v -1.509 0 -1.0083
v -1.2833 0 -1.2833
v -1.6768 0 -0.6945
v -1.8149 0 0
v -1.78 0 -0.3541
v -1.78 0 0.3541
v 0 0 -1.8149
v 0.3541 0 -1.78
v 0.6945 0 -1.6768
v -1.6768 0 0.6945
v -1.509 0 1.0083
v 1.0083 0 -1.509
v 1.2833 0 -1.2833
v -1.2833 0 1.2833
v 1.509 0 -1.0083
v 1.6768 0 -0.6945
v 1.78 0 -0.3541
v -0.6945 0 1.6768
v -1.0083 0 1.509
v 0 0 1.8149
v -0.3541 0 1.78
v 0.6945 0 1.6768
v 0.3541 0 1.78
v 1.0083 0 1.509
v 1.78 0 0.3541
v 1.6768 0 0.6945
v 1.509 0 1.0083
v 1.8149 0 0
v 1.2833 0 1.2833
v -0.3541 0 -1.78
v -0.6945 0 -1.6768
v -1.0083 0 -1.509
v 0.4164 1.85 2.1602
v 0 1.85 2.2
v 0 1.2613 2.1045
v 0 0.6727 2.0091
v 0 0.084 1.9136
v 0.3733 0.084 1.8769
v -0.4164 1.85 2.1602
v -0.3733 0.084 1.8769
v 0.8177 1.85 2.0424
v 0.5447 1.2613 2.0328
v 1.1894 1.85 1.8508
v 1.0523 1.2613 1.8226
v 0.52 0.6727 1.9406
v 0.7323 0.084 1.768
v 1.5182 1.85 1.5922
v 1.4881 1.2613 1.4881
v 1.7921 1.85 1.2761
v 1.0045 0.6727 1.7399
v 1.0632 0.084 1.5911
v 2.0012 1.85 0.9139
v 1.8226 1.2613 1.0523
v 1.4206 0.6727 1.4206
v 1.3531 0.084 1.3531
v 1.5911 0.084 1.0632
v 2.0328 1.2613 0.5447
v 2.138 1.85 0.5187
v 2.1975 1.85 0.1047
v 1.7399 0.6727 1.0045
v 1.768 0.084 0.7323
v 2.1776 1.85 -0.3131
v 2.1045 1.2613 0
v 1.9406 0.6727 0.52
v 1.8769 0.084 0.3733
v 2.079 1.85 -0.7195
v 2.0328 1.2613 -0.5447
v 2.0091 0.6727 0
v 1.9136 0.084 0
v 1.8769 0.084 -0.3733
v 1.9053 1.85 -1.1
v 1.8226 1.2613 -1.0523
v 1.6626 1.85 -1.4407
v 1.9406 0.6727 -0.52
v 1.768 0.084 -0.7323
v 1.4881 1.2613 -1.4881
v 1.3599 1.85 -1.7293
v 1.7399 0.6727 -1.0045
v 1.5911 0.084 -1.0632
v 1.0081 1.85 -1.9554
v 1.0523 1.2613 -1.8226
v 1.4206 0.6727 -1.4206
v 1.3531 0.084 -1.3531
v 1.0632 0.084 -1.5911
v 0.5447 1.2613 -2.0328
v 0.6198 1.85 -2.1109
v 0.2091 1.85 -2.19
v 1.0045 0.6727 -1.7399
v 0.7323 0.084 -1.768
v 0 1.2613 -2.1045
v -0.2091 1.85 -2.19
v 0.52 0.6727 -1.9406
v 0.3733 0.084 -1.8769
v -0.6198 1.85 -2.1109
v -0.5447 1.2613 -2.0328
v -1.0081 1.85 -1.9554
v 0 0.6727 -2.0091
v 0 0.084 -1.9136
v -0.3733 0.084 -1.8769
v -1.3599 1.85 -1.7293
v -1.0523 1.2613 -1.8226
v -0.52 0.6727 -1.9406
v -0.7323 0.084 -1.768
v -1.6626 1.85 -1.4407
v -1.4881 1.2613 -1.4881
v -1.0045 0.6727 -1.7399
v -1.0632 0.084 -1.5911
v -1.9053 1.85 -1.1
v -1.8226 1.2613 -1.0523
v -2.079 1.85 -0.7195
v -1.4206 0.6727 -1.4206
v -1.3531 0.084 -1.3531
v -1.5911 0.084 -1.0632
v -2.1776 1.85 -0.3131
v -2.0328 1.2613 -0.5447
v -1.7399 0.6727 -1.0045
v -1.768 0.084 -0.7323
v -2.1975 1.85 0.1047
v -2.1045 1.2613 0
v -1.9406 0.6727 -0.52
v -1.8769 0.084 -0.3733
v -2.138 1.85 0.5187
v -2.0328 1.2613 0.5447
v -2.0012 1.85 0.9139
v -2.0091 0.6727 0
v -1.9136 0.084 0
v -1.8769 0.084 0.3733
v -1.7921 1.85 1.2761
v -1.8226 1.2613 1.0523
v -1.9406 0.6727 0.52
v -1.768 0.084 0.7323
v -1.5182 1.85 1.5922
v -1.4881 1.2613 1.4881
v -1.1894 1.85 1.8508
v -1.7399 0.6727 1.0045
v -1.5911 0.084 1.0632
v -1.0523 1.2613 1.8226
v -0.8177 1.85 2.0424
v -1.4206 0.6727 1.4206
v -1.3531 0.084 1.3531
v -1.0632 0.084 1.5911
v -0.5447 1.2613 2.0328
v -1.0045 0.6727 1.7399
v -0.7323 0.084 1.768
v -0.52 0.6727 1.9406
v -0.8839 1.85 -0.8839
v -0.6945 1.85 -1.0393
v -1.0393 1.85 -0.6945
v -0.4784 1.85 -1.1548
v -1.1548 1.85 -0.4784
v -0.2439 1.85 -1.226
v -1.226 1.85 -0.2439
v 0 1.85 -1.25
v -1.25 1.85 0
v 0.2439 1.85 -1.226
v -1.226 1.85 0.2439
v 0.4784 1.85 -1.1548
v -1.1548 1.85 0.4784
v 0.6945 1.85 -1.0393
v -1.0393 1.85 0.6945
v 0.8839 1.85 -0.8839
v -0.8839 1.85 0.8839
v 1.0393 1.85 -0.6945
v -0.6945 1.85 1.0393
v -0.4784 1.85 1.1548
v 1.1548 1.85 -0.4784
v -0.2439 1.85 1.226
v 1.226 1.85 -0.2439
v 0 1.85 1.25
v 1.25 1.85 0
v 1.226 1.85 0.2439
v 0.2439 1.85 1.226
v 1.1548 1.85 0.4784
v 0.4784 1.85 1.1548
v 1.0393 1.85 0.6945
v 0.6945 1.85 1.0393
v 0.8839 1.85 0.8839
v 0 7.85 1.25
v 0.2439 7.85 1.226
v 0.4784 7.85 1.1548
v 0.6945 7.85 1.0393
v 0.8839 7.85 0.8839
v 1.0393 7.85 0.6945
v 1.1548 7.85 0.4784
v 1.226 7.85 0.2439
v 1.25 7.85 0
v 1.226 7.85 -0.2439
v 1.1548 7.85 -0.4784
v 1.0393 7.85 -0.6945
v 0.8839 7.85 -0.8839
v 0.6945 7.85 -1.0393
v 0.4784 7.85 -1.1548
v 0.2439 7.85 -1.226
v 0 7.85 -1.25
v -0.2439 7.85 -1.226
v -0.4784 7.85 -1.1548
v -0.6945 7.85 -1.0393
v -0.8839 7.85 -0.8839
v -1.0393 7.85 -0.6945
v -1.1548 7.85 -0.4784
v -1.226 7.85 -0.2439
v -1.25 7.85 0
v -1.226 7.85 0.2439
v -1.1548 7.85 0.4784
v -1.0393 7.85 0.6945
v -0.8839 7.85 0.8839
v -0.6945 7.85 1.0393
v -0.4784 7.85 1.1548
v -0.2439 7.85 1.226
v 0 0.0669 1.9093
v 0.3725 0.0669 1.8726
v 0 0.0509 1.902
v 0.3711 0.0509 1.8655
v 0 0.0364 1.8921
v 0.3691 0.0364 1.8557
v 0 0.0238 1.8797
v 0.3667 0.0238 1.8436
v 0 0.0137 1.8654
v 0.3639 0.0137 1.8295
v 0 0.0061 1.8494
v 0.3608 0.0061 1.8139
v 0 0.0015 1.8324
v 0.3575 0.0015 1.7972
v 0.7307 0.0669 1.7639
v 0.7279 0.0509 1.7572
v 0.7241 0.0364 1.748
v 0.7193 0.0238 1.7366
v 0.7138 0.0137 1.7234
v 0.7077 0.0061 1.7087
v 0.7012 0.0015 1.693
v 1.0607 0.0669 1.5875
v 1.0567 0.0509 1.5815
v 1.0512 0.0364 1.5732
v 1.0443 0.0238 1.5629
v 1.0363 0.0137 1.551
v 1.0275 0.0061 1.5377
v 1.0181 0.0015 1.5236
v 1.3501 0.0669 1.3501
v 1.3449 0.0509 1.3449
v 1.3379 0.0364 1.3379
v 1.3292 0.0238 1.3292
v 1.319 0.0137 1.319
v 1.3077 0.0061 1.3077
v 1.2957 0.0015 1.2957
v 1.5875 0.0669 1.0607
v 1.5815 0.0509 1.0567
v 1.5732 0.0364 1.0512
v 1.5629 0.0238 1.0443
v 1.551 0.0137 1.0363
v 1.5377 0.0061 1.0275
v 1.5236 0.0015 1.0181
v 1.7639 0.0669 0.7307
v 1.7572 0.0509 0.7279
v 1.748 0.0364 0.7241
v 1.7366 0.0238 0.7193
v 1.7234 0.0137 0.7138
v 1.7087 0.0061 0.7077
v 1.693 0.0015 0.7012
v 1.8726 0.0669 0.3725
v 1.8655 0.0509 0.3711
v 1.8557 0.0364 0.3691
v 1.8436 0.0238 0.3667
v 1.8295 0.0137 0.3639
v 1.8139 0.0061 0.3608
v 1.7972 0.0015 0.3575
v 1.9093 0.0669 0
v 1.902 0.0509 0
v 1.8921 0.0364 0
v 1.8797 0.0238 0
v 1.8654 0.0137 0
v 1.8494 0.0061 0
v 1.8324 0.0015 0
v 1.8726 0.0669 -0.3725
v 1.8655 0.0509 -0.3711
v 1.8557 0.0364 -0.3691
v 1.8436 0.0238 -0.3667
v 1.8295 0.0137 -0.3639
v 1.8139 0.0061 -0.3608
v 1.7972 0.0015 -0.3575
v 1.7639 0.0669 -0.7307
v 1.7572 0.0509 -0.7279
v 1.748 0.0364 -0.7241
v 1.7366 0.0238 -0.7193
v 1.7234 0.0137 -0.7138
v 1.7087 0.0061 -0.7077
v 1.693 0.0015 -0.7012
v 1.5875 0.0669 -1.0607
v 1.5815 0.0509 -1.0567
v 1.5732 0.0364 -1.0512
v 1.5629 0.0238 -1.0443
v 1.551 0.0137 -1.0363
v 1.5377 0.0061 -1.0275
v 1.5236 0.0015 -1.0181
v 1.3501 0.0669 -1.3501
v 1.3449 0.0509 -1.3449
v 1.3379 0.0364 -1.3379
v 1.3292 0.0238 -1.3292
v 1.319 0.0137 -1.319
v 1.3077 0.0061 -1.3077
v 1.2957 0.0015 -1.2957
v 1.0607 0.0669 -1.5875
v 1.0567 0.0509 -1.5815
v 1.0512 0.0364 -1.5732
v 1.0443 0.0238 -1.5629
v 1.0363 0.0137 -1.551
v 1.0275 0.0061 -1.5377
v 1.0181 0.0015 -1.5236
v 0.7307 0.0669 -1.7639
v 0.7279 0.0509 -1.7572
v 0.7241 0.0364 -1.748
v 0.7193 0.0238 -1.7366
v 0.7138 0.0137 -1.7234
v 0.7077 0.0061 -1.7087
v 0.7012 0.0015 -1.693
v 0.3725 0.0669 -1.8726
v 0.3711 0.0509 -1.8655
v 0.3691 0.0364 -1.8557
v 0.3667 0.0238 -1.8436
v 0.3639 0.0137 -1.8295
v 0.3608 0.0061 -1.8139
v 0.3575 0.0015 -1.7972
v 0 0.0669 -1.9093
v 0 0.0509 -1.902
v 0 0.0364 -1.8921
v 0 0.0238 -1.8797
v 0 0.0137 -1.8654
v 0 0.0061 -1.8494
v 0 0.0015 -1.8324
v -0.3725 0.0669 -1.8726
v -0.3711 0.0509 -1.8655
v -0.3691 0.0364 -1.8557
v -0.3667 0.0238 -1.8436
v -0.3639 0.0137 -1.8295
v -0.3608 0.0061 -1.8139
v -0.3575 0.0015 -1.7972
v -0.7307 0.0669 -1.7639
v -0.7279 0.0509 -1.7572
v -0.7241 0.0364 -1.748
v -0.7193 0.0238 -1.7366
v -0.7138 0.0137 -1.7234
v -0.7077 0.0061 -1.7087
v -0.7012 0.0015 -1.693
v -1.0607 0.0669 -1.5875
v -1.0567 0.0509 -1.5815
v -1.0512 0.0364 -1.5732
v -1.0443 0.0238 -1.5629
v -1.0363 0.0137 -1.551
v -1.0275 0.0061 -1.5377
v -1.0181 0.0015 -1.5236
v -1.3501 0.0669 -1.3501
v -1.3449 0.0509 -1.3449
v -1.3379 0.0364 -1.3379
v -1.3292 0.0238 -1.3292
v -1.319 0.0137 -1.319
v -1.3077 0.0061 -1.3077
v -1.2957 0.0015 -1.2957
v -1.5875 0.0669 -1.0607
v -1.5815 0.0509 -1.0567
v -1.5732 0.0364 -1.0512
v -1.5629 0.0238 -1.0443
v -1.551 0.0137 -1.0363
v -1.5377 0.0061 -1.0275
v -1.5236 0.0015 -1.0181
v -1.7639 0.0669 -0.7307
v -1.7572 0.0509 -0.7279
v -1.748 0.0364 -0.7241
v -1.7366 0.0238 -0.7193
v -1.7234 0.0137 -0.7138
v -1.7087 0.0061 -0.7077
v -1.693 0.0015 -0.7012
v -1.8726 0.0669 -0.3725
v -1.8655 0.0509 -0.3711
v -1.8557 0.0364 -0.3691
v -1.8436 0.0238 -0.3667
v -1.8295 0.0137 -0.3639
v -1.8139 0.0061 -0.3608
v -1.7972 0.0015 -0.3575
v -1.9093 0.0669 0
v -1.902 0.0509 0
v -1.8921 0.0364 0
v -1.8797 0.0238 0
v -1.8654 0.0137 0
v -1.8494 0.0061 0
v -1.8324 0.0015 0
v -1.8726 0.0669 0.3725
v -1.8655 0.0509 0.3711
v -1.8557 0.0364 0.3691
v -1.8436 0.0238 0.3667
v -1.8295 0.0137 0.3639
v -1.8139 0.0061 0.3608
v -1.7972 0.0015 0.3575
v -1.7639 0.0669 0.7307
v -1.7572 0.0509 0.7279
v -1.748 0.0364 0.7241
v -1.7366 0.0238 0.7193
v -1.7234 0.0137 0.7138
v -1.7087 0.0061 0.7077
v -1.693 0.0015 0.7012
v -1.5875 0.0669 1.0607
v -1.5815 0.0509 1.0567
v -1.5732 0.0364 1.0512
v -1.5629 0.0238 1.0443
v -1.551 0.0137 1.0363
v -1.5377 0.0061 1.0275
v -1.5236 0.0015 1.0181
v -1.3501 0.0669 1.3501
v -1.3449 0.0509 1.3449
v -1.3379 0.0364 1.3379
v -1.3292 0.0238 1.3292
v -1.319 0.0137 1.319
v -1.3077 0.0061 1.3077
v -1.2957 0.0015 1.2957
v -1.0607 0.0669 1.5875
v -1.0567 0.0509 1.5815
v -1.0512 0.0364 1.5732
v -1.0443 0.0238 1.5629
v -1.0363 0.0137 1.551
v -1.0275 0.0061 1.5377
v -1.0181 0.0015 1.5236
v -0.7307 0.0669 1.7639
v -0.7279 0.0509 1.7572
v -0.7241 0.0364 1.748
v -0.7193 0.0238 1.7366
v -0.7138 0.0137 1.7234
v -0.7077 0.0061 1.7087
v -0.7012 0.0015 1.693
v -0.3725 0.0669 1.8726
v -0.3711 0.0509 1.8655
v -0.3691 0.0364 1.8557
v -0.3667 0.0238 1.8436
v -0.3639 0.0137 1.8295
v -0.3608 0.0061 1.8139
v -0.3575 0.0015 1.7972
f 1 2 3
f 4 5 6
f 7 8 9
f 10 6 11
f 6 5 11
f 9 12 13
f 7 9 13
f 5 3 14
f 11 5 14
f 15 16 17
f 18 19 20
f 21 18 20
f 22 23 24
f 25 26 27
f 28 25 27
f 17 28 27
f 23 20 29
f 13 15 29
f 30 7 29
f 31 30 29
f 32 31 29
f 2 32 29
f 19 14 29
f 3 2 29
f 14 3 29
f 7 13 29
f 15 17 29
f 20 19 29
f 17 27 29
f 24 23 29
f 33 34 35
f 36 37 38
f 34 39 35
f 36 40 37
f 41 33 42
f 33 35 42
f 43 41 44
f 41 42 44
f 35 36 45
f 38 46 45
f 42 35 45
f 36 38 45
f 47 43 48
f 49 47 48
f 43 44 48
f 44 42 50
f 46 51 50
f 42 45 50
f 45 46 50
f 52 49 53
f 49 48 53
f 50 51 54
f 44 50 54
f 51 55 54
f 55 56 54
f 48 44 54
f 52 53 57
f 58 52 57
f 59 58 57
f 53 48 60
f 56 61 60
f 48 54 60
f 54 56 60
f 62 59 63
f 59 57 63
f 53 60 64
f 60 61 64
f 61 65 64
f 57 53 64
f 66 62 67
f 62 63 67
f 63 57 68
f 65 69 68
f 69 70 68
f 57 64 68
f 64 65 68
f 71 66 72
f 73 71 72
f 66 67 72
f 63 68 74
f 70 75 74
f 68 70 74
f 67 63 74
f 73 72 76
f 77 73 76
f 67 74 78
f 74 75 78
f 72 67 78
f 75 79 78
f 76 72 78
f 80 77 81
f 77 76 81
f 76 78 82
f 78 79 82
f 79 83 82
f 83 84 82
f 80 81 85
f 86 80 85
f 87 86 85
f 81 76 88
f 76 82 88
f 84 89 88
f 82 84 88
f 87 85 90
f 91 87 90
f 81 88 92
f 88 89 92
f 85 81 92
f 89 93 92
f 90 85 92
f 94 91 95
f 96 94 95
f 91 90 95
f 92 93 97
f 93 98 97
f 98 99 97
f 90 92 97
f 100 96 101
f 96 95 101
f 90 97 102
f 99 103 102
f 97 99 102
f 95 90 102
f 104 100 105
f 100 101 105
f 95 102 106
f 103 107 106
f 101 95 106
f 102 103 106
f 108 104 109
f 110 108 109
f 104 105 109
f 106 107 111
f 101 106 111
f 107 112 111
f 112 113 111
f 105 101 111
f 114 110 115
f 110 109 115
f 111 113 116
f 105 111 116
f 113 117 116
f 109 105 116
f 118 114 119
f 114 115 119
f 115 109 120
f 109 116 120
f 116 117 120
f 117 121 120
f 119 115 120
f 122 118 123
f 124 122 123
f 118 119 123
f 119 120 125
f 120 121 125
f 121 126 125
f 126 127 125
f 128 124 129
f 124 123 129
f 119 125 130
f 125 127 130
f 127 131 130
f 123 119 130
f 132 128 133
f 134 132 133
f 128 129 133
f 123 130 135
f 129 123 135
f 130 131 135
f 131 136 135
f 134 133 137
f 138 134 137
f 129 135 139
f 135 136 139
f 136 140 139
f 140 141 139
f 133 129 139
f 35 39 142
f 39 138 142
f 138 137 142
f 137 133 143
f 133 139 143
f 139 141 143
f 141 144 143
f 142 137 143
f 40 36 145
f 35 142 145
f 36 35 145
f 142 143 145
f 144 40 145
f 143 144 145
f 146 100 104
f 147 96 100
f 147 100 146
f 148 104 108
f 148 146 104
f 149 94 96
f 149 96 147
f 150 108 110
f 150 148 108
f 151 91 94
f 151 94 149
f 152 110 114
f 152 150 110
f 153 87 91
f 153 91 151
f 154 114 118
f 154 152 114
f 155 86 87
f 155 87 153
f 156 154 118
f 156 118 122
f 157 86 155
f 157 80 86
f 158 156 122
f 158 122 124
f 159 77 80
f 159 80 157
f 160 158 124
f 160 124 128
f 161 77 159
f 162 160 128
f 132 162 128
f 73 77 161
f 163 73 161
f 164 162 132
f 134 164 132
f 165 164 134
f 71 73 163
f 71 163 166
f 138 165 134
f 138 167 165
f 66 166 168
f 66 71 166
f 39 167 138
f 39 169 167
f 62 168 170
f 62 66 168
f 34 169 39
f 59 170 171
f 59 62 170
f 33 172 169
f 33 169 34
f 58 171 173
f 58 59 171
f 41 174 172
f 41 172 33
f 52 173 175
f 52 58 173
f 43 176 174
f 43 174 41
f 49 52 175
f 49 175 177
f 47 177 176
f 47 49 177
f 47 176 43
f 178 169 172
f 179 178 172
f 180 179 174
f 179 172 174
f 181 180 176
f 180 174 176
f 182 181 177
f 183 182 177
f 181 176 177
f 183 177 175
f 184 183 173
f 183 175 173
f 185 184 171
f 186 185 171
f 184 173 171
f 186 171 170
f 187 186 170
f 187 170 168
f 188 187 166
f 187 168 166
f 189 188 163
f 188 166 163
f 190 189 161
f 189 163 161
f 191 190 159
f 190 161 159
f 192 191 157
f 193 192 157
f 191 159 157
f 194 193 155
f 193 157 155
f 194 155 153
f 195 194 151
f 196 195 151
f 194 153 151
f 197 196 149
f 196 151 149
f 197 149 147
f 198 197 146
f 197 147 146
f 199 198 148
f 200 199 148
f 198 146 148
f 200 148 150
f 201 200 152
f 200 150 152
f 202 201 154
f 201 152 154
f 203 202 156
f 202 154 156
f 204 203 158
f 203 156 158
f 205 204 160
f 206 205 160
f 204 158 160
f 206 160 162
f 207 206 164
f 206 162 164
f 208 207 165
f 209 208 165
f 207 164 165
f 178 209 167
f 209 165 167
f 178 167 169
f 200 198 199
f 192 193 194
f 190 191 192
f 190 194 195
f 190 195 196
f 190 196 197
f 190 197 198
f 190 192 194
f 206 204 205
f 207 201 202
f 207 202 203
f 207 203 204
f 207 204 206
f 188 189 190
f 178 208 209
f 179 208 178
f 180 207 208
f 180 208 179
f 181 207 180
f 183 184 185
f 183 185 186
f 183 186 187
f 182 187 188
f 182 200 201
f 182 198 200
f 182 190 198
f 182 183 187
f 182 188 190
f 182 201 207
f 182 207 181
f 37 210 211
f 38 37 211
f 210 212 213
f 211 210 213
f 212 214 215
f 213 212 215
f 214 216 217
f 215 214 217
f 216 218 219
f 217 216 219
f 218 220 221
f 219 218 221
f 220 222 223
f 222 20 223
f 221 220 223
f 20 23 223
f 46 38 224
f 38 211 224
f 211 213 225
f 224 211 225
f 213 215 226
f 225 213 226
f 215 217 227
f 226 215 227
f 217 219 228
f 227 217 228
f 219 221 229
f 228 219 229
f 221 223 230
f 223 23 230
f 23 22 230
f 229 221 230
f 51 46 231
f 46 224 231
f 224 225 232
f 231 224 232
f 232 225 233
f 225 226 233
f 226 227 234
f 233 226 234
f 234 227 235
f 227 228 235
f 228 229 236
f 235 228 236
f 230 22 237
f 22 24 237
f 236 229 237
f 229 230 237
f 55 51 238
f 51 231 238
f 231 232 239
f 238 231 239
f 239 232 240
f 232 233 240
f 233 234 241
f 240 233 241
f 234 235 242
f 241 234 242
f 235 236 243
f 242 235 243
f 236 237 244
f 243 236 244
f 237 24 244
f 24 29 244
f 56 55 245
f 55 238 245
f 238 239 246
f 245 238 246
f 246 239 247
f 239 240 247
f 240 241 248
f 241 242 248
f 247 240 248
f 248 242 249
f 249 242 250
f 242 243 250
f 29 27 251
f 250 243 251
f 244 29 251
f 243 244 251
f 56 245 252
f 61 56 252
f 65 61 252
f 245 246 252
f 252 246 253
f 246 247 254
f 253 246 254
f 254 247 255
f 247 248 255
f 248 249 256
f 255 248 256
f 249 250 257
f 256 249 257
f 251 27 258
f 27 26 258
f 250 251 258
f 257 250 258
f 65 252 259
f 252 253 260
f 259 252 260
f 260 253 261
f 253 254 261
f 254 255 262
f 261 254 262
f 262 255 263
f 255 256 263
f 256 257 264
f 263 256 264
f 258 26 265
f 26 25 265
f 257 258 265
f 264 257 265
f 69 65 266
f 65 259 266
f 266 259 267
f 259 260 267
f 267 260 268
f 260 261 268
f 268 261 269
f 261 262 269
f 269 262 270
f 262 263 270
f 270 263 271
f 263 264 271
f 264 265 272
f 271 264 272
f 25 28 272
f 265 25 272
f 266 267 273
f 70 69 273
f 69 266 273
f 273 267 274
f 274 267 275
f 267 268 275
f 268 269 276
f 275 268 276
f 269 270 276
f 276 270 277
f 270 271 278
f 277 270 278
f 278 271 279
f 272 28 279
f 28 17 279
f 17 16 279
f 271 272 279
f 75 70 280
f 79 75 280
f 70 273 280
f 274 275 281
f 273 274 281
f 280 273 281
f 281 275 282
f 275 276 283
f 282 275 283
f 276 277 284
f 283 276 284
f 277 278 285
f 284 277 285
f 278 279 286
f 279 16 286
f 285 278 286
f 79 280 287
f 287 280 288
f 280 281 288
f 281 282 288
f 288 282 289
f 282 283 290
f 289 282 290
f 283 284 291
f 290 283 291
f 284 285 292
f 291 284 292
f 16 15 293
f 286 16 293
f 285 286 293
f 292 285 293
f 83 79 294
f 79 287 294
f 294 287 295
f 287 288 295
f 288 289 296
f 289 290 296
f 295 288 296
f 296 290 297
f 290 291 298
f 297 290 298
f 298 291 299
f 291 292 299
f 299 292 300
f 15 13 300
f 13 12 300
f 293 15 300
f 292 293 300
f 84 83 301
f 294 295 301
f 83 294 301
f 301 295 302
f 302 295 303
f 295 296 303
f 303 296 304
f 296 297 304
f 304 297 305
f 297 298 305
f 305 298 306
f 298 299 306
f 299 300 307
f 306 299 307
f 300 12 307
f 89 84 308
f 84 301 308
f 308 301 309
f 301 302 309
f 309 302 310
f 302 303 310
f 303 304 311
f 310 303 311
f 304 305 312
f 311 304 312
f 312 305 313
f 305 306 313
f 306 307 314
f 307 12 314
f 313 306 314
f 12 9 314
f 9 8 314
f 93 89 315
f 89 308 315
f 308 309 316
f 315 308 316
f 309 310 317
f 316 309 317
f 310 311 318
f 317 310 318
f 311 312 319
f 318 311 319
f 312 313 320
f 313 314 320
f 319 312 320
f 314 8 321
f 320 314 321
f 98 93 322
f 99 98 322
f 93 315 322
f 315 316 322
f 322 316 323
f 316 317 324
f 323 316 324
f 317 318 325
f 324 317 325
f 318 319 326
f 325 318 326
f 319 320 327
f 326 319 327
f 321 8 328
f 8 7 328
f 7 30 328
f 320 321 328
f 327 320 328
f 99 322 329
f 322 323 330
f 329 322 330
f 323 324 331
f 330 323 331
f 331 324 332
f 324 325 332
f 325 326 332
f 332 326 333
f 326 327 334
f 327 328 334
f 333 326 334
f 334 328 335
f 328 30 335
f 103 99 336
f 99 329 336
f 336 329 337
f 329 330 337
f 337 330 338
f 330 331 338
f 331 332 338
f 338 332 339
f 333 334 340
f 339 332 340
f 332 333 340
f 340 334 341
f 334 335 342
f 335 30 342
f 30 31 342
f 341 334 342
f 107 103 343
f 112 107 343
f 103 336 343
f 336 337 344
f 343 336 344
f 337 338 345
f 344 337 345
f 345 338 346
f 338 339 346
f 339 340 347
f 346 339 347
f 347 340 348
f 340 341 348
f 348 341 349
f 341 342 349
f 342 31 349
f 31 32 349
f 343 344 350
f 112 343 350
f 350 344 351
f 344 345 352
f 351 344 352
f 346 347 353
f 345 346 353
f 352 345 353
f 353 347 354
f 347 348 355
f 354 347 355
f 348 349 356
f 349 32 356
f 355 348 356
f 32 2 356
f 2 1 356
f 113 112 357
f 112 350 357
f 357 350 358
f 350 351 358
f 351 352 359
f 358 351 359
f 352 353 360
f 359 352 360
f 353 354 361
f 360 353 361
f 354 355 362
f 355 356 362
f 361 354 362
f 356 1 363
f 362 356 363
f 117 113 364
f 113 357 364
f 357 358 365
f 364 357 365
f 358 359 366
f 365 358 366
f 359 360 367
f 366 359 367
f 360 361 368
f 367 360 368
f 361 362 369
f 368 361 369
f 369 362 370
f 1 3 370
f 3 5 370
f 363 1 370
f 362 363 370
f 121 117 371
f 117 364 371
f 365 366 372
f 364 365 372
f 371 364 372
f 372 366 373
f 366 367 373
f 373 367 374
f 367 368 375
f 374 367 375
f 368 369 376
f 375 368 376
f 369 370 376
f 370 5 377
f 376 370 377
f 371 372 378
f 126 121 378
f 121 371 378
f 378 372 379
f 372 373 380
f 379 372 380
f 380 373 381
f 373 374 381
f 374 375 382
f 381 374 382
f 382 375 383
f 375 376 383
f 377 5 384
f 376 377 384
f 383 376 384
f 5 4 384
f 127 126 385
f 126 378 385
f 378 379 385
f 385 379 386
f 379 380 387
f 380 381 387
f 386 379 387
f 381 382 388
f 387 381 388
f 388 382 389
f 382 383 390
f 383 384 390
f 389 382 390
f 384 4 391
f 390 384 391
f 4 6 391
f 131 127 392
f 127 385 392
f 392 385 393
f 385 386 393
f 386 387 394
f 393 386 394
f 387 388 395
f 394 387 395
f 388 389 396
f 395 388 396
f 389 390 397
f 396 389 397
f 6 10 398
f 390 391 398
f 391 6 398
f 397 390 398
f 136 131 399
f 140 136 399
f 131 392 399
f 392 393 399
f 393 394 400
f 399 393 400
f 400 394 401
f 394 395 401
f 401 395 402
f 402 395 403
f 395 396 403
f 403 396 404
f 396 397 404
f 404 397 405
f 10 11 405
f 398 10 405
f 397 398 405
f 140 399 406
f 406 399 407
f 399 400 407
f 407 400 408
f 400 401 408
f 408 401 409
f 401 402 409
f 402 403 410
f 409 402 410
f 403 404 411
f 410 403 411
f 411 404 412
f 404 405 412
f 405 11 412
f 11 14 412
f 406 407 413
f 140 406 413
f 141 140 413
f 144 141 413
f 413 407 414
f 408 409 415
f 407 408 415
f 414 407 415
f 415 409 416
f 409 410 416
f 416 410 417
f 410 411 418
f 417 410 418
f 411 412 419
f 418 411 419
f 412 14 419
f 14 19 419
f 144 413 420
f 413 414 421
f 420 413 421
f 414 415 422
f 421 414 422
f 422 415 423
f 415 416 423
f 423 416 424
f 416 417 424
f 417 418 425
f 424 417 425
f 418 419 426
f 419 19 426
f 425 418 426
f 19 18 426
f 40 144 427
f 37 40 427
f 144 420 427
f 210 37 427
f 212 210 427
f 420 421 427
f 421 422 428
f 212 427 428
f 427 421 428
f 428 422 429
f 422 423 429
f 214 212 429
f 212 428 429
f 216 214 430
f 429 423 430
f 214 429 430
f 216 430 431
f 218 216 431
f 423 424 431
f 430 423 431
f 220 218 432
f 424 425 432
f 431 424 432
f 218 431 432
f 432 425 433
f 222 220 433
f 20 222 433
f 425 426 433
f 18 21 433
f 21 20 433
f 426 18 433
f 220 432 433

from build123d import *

# Parameters (mm, degrees)
ESQUISSE1_R        = 2.2
BOSS_EXTRU_1_DEPTH = 1.85
ESQUISSE2_R        = 1.25
BOSS_EXTRU_2_DEPTH = 6
CHANFREIN1_SIZE    = 1.85
CHANFREIN1_SIZE_2  = 0.3
CONG_1_R           = 0.1


with BuildPart() as part:
    # Esquisse1 → Boss.-Extru.1 (new body)
    with BuildSketch(Plane(origin=(0, 0, 0), x_dir=(1, 0, 0), z_dir=(0, 1, 0))):
        with Locations(Location((0, 0, 0), (0, 0, 270))):
            Circle(ESQUISSE1_R)
    extrude(amount=BOSS_EXTRU_1_DEPTH)

    # Esquisse2 → Boss.-Extru.2 (add)
    with BuildSketch(Plane(origin=(0, 1.85, 0), x_dir=(1, 0, 0), z_dir=(0, 1, 0))):
        with Locations(Location((0, 0, 0), (0, 0, 270))):
            Circle(ESQUISSE2_R)
    extrude(amount=BOSS_EXTRU_2_DEPTH)

    # Chanfrein1
    # the kernel refuses this chamfer: 1.85, 0.3 mm, written as the material it takes off along each edge
    with BuildSketch(Plane(origin=(0, 0, 0), x_dir=(0, 0, 1), z_dir=(-1, 0, 0))) as chanfrein1_piece_1:
        Polygon((2.2, CHANFREIN1_SIZE), (2.2 - CHANFREIN1_SIZE_2, 0), (2.2, 0), align=None)
    revolve(axis=Axis((0, 0, 0), (0, 1, 0)), mode=Mode.SUBTRACT)

    # Congé1
    cong_1_edges = [part.edges().sort_by_distance(p)[0] for p in [
        (0, 0, -1.9),
    ]]
    fillet(cong_1_edges, radius=CONG_1_R)


solid = part.part
